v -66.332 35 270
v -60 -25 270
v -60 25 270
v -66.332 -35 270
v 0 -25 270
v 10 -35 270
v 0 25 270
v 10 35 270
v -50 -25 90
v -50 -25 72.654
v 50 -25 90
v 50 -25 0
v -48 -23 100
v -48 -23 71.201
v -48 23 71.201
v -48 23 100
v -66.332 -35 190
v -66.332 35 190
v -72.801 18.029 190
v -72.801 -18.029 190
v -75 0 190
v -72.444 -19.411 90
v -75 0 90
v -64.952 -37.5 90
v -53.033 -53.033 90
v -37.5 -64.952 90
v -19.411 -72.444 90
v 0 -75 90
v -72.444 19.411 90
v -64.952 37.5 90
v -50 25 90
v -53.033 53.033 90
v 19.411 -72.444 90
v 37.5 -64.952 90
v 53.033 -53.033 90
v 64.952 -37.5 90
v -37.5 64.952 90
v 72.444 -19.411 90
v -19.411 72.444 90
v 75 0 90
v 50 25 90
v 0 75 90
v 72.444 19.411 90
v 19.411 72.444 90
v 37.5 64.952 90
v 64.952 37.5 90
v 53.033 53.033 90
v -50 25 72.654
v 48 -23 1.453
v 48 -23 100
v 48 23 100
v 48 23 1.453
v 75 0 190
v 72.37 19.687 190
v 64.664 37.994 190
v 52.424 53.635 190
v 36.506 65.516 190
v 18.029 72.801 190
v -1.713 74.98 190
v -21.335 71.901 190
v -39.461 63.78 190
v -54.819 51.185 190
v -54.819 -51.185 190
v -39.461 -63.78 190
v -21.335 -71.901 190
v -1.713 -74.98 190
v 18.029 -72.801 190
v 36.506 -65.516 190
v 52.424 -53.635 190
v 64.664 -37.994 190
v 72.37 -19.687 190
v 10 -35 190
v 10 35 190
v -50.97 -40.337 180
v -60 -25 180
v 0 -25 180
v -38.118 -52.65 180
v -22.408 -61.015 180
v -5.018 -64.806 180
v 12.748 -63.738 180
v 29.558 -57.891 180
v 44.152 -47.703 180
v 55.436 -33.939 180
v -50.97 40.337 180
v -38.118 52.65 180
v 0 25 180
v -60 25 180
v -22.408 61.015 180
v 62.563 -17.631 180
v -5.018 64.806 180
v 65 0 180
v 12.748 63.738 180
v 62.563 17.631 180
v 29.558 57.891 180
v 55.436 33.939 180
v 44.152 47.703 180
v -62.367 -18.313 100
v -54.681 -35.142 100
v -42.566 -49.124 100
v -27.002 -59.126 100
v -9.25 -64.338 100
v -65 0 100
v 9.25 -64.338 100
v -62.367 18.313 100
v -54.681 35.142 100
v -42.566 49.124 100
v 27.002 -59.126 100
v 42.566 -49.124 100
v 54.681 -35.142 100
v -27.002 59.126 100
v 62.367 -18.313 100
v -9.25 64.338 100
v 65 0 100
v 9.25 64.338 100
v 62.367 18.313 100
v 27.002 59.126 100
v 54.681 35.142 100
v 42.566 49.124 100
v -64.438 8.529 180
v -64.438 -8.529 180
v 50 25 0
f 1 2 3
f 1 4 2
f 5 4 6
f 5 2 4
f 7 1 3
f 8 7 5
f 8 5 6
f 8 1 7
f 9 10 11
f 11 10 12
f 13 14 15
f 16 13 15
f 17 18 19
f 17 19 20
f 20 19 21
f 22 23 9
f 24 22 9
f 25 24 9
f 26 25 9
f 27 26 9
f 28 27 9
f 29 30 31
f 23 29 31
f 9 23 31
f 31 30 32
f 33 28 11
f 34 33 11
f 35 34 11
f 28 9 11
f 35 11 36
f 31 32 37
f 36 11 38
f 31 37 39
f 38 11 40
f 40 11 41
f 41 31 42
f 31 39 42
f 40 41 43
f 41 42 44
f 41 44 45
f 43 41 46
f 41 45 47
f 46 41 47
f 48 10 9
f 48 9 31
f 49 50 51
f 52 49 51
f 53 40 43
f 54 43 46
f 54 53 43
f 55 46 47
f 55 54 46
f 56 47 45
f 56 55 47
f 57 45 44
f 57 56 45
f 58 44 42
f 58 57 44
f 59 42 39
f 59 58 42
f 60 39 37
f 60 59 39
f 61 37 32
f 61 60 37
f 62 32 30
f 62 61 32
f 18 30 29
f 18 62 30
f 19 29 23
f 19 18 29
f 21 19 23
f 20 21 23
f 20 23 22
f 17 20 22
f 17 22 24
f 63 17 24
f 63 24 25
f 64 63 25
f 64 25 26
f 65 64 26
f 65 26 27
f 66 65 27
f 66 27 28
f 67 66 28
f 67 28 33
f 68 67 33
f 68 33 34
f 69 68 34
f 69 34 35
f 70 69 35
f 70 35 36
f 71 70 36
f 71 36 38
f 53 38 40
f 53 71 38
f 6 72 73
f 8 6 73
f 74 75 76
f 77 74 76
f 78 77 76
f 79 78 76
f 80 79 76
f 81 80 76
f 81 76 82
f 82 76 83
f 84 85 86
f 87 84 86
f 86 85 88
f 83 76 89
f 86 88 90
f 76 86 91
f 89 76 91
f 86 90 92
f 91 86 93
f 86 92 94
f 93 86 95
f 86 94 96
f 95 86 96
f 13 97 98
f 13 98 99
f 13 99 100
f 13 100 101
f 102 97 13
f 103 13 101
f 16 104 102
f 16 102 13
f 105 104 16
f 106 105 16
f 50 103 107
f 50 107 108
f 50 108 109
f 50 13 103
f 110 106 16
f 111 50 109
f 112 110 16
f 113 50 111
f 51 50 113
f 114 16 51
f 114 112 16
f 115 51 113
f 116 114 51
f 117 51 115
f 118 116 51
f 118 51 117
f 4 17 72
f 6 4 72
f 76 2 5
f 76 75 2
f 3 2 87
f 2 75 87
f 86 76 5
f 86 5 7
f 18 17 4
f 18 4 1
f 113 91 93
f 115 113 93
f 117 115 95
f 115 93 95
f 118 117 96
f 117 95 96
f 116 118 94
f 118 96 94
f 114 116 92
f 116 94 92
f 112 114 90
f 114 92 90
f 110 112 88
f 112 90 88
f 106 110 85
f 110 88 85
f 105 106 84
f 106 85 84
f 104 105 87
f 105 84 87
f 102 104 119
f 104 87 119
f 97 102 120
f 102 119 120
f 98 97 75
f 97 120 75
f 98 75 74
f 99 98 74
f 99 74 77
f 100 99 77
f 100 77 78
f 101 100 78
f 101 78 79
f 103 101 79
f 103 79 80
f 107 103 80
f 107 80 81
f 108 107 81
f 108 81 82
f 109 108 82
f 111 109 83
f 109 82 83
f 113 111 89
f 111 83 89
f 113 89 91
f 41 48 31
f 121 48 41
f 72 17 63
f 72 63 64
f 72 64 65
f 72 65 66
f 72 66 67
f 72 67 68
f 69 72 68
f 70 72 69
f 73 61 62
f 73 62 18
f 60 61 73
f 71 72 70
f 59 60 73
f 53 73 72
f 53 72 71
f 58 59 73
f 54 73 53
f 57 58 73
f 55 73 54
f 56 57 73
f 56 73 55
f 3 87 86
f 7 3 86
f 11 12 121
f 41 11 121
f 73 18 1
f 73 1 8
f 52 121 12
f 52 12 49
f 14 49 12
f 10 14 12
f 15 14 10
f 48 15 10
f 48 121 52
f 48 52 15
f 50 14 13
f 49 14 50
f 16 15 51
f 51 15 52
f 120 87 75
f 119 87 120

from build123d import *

# Parameters (mm, degrees)
CROQUIS1_W              = 100
CROQUIS1_H              = 50
CROQUIS1_W_2            = 96
CROQUIS1_H_2            = 46
SALIENTE_EXTRUIR1_DEPTH = 100
CORTAR_EXTRUIR1_DEPTH   = 100
CROQUIS3_R              = 75
CROQUIS3_W              = 100
CROQUIS3_H              = 50
SALIENTE_EXTRUIR2_DEPTH = 10
SALIENTE_EXTRUIR3_START = 80
CROQUIS4_R              = 75
CROQUIS4_R_2            = 65
SALIENTE_EXTRUIR3_DEPTH = 80
SALIENTE_EXTRUIR4_START = 10
CROQUIS5_R              = 75
CROQUIS5_W              = 60
CROQUIS5_H              = 50
SALIENTE_EXTRUIR4_DEPTH = 10
CROQUIS6_W              = 76.332495807
CROQUIS6_H              = 70
CROQUIS6_W_2            = 60
CROQUIS6_H_2            = 50
SALIENTE_EXTRUIR5_DEPTH = 80


with BuildPart() as part:
    # Croquis1 → Saliente-Extruir1 (new body)
    with BuildSketch(Plane.XY):
        Rectangle(CROQUIS1_W, CROQUIS1_H)
        Rectangle(CROQUIS1_W_2, CROQUIS1_H_2, mode=Mode.SUBTRACT)
    extrude(amount=SALIENTE_EXTRUIR1_DEPTH)

    # Croquis2 → Cortar-Extruir1 (cut)
    with BuildSketch(Plane(origin=(0, 25, 0), x_dir=(1, 0, 0), z_dir=(0, 1, 0))):
        Polygon((-50, 0), (50, 0), (-50, -72.654252801), align=None)
    extrude(amount=-CORTAR_EXTRUIR1_DEPTH, mode=Mode.SUBTRACT)

    # Croquis3 → Saliente-Extruir2 (add)
    with BuildSketch(Plane.XY.offset(100)):
        Circle(CROQUIS3_R)
        Rectangle(CROQUIS3_W, CROQUIS3_H, mode=Mode.SUBTRACT)
    extrude(amount=-SALIENTE_EXTRUIR2_DEPTH)

    # Croquis4 → Saliente-Extruir3 (add)
    with BuildSketch(Plane.XY.offset(100).offset(SALIENTE_EXTRUIR3_START)):
        Circle(CROQUIS4_R)
        Circle(CROQUIS4_R_2, mode=Mode.SUBTRACT)
    extrude(amount=-SALIENTE_EXTRUIR3_DEPTH)

    # Croquis5 → Saliente-Extruir4 (add)
    with BuildSketch(Plane.XY.offset(180).offset(SALIENTE_EXTRUIR4_START)):
        Circle(CROQUIS5_R)
        with Locations((-30, 0)):
            Rectangle(CROQUIS5_W, CROQUIS5_H, mode=Mode.SUBTRACT)
    extrude(amount=-SALIENTE_EXTRUIR4_DEPTH)

    # Croquis6 → Saliente-Extruir5 (add)
    with BuildSketch(Plane.XY.offset(190)):
        with Locations((-28.166247904, 0)):
            Rectangle(CROQUIS6_W, CROQUIS6_H)
        with Locations((-30, 0)):
            Rectangle(CROQUIS6_W_2, CROQUIS6_H_2, mode=Mode.SUBTRACT)
    extrude(amount=SALIENTE_EXTRUIR5_DEPTH)


solid = part.part
